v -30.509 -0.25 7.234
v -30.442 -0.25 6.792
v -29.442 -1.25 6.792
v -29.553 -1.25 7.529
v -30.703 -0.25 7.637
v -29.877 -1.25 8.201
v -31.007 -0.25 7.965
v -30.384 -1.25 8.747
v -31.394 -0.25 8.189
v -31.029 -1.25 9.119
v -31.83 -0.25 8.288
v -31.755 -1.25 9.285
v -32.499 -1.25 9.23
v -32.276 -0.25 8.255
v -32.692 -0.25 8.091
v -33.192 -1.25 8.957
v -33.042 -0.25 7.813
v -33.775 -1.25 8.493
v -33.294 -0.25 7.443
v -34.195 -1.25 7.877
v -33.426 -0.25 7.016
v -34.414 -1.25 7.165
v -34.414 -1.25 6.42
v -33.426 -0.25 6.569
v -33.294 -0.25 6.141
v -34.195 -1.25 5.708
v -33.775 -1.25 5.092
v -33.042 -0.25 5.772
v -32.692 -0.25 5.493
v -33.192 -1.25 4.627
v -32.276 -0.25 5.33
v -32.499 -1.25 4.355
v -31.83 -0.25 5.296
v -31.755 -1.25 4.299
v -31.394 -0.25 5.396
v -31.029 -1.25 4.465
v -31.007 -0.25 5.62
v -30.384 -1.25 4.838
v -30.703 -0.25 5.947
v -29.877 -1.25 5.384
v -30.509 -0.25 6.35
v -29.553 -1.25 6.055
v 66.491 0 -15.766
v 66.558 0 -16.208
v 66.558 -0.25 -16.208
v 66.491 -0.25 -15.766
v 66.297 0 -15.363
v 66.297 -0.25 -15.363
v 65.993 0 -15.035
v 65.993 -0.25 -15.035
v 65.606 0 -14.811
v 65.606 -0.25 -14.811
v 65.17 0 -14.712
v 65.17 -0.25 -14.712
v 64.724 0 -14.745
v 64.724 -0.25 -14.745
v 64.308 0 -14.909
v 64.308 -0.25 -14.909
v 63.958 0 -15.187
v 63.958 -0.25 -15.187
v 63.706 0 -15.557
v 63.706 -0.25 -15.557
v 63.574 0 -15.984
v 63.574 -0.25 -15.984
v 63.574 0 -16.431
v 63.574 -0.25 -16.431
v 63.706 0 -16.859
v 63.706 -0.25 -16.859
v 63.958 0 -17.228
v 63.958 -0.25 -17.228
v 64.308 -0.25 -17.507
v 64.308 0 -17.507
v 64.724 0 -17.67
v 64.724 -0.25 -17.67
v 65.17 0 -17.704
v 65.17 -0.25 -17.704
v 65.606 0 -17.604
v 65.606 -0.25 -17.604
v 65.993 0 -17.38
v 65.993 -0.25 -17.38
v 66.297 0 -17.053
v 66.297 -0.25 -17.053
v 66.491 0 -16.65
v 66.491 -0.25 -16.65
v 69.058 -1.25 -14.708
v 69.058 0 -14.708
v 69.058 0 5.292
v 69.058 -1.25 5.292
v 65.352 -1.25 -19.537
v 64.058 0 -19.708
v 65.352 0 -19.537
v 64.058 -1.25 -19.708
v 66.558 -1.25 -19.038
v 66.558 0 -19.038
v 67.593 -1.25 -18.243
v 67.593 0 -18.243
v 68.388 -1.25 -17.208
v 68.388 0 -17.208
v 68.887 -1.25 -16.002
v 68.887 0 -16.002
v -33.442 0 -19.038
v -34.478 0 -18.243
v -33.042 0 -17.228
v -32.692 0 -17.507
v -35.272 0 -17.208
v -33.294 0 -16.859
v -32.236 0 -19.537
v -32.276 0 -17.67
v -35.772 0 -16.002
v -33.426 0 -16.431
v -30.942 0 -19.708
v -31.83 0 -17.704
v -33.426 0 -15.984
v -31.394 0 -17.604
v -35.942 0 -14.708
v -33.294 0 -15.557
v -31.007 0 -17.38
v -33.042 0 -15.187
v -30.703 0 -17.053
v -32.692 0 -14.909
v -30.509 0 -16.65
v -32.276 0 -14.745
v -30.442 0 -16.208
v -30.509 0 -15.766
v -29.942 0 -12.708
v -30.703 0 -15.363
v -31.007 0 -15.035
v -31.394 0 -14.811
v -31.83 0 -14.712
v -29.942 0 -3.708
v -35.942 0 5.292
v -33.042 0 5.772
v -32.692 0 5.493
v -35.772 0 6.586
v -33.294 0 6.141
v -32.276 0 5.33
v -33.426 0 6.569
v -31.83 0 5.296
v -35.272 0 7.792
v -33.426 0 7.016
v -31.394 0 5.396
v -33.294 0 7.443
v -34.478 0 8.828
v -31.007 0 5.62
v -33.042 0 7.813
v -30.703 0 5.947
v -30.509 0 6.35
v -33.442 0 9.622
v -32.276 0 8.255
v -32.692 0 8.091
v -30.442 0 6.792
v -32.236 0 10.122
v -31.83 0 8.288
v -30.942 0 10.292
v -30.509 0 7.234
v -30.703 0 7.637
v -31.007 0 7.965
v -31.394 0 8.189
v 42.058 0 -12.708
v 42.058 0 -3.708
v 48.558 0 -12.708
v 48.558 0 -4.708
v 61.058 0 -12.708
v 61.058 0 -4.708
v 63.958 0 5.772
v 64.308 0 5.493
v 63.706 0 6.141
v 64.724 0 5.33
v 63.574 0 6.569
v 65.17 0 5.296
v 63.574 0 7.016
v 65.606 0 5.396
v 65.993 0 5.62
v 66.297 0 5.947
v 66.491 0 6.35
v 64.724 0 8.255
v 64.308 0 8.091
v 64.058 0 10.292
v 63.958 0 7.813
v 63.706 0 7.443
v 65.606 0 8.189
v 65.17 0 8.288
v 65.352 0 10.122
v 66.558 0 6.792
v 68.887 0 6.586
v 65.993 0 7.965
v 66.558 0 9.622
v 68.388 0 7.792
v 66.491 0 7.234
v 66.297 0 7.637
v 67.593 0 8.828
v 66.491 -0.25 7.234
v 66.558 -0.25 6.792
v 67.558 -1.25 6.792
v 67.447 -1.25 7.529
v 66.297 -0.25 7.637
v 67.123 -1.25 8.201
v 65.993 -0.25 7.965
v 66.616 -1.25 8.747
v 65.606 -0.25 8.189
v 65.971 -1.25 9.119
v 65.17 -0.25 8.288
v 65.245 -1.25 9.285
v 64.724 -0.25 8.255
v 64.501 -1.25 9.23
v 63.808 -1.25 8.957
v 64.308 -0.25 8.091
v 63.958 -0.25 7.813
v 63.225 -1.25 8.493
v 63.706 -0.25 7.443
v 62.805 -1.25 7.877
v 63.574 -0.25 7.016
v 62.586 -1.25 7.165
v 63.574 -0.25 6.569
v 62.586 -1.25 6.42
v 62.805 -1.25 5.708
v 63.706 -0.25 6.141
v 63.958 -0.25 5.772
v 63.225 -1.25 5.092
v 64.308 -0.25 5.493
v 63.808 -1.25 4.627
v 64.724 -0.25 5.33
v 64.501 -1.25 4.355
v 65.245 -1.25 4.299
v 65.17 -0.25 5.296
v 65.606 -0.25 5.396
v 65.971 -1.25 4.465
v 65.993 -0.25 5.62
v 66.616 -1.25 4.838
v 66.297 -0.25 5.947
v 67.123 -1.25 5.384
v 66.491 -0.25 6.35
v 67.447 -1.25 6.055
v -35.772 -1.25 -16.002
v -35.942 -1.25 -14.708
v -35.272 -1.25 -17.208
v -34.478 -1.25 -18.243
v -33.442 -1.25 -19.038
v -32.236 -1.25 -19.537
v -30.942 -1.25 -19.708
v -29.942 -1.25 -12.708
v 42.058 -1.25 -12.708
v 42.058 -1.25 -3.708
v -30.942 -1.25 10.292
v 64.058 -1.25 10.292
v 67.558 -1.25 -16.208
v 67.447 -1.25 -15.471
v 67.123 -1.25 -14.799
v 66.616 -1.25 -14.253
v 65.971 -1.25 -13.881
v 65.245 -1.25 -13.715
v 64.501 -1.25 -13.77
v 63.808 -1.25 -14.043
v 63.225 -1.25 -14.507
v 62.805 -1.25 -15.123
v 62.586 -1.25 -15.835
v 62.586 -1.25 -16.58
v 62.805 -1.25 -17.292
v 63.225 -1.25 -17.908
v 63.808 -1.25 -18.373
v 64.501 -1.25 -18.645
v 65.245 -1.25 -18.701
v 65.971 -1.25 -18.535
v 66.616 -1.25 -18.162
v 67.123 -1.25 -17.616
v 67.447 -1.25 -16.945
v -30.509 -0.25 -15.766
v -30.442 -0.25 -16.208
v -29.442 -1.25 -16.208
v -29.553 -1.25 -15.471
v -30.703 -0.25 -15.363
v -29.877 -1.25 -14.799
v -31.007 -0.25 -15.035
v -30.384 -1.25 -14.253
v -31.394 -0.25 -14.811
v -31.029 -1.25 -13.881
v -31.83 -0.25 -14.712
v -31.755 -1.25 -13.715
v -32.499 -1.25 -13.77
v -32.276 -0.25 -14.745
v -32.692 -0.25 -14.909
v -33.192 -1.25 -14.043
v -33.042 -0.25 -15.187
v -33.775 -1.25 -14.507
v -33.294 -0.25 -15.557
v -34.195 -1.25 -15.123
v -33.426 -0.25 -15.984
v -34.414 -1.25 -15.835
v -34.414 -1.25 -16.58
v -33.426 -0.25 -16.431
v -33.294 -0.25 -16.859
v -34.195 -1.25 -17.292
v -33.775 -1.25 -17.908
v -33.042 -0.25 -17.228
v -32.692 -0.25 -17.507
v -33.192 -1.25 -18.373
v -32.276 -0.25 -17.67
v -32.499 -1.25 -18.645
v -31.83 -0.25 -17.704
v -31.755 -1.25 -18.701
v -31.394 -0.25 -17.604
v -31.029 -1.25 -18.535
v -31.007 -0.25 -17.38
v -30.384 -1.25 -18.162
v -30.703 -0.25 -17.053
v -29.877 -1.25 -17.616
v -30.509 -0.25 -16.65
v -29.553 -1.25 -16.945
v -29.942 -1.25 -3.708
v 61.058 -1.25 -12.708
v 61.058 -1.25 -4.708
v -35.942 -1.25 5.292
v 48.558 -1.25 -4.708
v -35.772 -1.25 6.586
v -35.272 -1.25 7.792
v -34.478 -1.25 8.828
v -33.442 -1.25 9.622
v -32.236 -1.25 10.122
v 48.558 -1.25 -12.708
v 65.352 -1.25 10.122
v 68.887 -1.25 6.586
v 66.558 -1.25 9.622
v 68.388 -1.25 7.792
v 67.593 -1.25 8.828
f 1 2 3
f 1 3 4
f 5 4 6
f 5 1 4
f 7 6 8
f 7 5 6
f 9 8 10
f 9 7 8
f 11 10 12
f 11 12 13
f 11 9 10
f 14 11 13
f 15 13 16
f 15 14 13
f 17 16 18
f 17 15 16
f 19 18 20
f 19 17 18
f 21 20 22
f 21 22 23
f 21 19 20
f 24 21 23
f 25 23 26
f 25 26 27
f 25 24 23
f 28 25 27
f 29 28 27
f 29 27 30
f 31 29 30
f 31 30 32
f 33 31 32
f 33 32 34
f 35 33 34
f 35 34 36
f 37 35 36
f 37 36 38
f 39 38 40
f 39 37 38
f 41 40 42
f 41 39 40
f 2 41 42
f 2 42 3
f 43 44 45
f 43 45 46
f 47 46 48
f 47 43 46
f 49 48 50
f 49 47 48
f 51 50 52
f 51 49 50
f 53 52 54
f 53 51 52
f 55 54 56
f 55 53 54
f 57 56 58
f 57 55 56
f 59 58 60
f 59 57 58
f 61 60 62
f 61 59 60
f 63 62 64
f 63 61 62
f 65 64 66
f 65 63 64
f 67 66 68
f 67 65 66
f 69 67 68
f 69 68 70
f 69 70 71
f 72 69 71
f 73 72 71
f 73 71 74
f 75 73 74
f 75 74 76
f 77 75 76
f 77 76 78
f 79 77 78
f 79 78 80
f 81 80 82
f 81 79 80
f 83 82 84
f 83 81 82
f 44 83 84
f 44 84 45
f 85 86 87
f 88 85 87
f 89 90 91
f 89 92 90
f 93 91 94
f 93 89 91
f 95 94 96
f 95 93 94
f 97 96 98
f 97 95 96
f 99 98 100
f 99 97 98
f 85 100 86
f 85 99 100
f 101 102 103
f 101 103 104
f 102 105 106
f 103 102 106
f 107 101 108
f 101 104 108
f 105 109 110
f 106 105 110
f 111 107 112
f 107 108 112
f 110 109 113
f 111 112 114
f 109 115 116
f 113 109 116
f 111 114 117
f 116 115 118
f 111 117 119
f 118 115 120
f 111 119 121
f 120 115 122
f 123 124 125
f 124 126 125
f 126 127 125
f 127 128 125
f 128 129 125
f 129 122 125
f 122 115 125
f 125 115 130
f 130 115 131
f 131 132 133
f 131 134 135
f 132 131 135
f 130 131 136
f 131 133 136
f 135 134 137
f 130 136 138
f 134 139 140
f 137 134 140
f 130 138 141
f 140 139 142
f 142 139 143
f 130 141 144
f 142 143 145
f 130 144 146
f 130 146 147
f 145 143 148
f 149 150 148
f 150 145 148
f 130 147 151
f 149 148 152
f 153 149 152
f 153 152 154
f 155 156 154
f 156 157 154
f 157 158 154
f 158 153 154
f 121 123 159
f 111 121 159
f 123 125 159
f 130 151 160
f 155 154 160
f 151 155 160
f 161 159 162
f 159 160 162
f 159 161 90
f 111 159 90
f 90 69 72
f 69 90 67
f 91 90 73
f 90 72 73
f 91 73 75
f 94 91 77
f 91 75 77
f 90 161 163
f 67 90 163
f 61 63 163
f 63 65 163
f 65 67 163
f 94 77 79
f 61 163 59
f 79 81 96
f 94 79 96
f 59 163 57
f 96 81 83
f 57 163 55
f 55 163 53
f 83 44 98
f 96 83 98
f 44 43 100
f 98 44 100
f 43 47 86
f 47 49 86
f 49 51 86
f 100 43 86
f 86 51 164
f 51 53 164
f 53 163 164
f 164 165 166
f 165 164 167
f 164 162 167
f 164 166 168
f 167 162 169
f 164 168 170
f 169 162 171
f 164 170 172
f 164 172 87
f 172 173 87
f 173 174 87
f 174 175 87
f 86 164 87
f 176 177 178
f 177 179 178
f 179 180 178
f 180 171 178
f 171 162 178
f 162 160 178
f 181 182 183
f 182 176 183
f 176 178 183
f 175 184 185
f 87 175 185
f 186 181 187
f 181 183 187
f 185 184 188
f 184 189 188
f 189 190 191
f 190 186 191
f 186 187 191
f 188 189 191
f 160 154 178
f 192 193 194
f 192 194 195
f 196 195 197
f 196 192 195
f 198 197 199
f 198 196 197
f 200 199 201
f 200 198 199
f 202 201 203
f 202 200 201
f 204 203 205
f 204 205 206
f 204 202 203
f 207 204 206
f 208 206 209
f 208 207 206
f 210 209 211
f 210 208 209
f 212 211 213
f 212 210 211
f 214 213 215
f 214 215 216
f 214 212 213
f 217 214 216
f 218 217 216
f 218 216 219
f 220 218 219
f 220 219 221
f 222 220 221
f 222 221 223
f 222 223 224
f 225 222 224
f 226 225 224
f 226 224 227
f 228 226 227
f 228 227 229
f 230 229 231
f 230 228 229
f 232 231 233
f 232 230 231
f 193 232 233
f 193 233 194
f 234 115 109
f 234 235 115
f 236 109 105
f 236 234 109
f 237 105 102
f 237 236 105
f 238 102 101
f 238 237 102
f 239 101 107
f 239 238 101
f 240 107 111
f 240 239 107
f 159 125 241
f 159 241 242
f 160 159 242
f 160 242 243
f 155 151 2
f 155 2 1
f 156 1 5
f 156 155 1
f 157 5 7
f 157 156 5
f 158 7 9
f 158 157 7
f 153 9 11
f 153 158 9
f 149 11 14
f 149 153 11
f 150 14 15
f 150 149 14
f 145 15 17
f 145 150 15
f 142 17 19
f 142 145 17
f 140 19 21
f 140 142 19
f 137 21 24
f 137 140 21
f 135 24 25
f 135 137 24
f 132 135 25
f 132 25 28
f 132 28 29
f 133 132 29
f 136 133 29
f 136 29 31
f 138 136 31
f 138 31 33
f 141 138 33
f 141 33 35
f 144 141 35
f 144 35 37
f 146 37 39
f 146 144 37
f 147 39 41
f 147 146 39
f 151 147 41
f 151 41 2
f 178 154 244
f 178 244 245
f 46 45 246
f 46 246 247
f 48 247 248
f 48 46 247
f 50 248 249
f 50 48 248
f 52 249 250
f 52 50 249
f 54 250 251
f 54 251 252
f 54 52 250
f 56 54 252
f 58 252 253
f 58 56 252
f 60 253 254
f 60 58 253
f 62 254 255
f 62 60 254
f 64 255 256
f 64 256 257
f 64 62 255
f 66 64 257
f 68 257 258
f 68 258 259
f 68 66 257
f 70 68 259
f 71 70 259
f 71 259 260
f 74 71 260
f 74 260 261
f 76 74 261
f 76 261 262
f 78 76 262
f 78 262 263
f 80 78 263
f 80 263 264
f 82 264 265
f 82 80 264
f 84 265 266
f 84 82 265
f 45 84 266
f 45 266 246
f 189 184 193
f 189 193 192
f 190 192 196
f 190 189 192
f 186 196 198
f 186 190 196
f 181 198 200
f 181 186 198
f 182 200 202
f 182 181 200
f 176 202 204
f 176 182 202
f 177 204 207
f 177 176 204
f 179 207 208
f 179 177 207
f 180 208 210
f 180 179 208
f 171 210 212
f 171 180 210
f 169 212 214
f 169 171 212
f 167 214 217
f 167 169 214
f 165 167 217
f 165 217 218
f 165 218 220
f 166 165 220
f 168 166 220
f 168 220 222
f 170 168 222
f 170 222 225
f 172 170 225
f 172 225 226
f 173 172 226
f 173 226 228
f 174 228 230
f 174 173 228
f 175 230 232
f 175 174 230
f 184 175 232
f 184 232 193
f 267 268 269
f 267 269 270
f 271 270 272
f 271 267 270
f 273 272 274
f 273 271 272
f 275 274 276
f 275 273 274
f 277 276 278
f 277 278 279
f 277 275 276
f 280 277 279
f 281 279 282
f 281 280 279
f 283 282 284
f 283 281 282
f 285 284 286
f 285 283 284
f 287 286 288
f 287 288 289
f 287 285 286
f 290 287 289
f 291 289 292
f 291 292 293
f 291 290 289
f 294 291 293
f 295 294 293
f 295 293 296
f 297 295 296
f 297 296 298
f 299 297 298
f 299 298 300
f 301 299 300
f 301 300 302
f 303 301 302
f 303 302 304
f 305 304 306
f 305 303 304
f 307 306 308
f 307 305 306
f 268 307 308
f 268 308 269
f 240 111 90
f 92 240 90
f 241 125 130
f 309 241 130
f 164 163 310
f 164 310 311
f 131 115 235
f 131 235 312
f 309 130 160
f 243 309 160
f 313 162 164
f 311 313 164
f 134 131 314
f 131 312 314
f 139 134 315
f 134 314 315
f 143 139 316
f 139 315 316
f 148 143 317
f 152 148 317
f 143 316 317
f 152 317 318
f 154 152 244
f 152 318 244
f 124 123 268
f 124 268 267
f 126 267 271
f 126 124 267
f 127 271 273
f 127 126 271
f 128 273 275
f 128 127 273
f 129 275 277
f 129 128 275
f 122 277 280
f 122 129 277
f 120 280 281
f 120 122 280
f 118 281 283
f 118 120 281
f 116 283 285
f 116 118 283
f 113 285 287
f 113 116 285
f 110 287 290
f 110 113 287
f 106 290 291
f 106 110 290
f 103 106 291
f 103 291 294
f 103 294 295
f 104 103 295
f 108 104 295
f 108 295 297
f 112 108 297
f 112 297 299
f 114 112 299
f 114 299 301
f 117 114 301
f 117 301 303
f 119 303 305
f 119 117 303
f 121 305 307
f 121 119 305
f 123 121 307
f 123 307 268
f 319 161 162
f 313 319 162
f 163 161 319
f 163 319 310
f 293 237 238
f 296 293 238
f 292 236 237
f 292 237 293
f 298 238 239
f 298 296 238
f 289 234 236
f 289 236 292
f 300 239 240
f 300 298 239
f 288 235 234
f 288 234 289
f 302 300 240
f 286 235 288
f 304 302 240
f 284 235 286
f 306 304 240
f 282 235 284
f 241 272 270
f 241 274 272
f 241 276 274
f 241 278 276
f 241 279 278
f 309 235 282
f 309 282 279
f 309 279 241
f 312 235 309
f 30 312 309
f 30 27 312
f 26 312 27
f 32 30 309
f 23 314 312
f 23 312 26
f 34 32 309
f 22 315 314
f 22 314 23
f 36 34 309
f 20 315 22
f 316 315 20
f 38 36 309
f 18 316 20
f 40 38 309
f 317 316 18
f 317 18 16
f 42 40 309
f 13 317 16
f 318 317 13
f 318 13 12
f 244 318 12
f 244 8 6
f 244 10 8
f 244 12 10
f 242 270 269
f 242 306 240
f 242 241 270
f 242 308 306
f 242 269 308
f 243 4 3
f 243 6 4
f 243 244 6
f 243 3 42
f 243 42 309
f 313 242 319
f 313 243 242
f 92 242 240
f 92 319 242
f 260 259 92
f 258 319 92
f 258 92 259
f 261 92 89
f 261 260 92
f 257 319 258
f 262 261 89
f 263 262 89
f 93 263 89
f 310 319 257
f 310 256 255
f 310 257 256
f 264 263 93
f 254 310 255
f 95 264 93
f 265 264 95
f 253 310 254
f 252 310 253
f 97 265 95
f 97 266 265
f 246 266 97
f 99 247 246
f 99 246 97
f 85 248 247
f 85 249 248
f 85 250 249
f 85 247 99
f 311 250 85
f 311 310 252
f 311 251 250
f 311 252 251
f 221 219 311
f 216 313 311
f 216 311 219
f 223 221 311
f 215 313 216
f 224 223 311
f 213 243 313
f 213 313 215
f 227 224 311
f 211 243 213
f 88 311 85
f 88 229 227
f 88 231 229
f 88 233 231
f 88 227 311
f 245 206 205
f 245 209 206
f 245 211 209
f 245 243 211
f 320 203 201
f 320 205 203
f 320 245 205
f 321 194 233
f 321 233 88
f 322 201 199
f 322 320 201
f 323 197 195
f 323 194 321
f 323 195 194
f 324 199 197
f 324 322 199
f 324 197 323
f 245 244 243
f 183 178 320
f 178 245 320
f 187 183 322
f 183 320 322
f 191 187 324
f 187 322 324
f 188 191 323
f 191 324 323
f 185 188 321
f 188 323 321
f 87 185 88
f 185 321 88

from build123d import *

# Parameters (mm, degrees)
F0_W     = 105
F0_H     = 30
F0_R     = 1.5
F0_W_2   = 72
F0_H_2   = 9
F0_W_3   = 12.5
F0_H_3   = 8
F1_DEPTH = 1.25
F2_R     = 5
F3_SIZE  = 1


with BuildPart() as f1:
    # F0 (on Front) → F1 (new body)
    with BuildSketch(Plane.XZ):
        with Locations((16.557691, -4.707695)):
            Rectangle(F0_W, F0_H)
        with Locations((-31.942309, -16.207695)):
            Circle(F0_R, mode=Mode.SUBTRACT)
        with Locations((6.057691, -8.207695)):
            Rectangle(F0_W_2, F0_H_2, mode=Mode.SUBTRACT)
        with Locations((65.057691, -16.207695)):
            Circle(F0_R, mode=Mode.SUBTRACT)
        with Locations((54.807691, -8.707695)):
            Rectangle(F0_W_3, F0_H_3, mode=Mode.SUBTRACT)
        with Locations((-31.942309, 6.792305)):
            Circle(F0_R, mode=Mode.SUBTRACT)
        with Locations((65.057691, 6.792305)):
            Circle(F0_R, mode=Mode.SUBTRACT)
    extrude(amount=F1_DEPTH)

    # F2
    f2_edges = [f1.edges().sort_by_distance(p)[0] for p in [
        (69.057691, -0.625, 10.292305),
        (69.057691, -0.625, -19.707695),
        (-35.942309, -0.625, -19.707695),
        (-35.942309, -0.625, 10.292305),
    ]]
    fillet(f2_edges, radius=F2_R)

    # F3
    f3_edges = [f1.edges().sort_by_distance(p)[0] for p in [
        (-33.442309, -1.25, 6.792305),
        (-33.442309, -1.25, -16.207695),
        (63.557691, -1.25, -16.207695),
        (63.557691, -1.25, 6.792305),
    ]]
    chamfer(f3_edges, length=F3_SIZE)


solid = f1.part
